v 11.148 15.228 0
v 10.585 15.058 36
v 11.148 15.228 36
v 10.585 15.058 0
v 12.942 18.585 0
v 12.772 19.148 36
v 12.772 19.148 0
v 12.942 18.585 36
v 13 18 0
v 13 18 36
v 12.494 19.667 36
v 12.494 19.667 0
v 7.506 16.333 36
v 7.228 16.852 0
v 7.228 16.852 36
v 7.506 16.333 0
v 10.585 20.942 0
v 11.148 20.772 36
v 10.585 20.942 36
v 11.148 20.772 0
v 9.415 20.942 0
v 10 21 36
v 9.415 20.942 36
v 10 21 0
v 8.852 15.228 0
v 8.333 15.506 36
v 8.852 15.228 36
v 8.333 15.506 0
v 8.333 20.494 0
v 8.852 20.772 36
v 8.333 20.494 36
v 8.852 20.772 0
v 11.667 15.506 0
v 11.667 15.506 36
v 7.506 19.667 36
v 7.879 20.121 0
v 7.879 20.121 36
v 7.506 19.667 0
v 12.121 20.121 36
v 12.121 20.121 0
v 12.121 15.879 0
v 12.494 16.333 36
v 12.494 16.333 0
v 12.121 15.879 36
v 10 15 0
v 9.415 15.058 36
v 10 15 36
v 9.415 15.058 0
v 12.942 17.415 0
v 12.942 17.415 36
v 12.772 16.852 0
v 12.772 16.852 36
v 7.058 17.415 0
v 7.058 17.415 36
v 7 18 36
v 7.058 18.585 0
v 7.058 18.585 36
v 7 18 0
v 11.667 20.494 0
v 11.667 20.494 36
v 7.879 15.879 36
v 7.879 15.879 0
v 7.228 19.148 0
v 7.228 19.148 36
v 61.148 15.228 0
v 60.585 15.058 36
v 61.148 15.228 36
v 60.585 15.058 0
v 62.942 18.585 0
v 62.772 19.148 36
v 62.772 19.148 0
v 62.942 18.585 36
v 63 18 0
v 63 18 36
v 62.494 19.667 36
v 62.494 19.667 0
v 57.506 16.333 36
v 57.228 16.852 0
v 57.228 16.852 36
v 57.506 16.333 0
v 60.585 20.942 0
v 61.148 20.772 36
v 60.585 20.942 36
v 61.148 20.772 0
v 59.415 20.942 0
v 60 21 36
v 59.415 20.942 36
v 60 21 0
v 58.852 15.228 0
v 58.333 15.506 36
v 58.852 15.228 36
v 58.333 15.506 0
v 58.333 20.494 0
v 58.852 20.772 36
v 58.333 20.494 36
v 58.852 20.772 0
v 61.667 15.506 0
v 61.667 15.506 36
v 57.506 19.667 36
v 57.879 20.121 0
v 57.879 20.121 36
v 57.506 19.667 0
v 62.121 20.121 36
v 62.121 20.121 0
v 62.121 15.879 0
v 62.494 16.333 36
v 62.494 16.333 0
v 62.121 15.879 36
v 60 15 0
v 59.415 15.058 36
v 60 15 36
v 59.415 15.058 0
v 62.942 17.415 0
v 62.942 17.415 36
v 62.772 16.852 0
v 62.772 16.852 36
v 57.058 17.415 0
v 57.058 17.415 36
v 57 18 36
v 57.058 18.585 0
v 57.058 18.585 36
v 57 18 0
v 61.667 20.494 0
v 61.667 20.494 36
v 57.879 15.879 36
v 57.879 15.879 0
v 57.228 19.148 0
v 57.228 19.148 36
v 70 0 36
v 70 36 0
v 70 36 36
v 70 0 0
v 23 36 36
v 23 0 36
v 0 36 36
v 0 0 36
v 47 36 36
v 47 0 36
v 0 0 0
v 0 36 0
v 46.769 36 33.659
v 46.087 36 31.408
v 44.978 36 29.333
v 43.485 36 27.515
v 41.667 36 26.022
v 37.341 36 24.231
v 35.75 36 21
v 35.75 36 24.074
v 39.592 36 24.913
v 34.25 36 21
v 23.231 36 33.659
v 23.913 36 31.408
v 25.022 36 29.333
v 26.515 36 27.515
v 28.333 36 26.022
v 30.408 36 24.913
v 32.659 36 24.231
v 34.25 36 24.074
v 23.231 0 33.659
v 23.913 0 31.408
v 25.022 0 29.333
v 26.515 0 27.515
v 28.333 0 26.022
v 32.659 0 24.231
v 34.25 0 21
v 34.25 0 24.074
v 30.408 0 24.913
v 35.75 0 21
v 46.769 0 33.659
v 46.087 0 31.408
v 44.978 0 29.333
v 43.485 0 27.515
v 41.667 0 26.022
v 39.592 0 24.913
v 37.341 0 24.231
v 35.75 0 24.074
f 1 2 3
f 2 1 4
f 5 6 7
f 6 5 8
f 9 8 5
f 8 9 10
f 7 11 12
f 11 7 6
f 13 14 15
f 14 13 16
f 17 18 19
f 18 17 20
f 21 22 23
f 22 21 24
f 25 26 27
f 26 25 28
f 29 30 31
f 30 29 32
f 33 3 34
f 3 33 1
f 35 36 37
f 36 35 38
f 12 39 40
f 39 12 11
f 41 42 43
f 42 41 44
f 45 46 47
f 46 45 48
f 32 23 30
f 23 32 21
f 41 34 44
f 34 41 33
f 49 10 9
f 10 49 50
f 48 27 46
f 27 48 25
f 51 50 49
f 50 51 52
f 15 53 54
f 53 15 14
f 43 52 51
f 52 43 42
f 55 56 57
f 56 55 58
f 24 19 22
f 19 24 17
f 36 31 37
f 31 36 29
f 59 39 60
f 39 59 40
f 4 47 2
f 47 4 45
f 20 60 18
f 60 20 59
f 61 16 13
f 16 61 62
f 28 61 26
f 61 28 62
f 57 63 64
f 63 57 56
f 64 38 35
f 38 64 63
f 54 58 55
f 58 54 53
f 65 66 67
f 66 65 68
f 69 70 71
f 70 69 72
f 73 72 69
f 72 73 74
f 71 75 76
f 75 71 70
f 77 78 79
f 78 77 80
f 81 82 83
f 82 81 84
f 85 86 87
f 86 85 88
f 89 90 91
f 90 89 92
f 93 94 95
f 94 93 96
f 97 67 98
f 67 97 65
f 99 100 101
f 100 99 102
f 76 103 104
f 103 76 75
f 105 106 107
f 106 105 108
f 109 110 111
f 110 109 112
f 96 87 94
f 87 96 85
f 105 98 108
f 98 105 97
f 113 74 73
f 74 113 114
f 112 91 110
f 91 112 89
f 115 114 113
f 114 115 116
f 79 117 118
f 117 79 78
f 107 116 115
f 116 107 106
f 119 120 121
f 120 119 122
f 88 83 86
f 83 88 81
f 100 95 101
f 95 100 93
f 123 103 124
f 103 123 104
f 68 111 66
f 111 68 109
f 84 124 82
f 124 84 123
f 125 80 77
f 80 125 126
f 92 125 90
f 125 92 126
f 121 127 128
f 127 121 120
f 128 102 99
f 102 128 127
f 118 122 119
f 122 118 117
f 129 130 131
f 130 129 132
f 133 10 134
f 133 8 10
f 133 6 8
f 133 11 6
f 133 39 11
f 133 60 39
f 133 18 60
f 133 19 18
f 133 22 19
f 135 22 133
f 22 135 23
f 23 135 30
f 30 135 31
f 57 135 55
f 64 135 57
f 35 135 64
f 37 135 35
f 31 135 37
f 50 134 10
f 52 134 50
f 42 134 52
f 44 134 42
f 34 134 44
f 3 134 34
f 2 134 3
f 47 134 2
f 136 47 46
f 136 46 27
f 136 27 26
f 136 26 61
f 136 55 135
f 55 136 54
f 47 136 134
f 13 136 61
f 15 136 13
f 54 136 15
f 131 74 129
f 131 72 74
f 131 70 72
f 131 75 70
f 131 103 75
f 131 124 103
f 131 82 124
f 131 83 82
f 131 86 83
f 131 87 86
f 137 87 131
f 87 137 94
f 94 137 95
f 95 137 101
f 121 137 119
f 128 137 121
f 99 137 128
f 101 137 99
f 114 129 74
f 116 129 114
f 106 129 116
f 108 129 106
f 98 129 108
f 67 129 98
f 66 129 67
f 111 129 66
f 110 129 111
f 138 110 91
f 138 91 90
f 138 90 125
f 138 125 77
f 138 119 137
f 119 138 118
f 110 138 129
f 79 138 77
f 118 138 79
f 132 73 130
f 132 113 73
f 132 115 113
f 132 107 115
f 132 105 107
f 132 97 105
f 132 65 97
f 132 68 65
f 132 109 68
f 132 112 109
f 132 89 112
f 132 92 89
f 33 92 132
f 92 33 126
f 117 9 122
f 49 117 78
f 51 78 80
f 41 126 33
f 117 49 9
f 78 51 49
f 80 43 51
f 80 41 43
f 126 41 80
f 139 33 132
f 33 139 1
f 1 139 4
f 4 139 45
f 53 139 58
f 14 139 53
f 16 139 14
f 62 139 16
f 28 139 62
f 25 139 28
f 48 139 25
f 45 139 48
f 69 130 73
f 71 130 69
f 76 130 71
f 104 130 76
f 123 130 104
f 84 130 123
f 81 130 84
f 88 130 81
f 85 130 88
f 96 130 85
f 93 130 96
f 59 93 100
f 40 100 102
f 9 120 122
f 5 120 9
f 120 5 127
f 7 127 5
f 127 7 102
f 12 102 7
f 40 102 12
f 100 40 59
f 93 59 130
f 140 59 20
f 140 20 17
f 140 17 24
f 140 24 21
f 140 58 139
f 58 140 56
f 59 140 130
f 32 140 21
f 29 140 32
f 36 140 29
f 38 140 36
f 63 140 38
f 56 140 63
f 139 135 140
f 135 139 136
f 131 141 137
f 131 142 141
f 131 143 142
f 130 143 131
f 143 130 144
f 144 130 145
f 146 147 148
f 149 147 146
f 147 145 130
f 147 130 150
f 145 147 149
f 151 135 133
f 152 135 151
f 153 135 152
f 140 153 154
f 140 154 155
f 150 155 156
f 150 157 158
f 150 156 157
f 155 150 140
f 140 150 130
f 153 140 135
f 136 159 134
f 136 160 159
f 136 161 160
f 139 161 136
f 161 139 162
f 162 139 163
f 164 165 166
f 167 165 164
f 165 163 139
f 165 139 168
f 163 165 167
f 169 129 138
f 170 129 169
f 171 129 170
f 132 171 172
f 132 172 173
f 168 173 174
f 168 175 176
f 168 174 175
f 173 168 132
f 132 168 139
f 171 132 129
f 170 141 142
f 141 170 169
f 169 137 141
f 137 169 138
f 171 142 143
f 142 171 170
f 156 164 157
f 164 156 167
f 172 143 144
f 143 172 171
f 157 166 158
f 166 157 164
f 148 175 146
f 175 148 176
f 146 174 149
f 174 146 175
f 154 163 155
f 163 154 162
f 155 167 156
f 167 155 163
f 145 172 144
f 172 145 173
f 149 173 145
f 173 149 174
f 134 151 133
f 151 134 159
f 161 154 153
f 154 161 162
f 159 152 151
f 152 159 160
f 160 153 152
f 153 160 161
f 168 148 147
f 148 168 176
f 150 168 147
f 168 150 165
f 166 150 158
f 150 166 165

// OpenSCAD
$fn = 32;

// ----------------------------------------------------------------------
// Saddle clamp: split shaft clamp
// ----------------------------------------------------------------------

// --- parameters (mm) ---
blk_l = 70;               // block length, X
blk_w = 36;               // block width, Y
blk_h = 36;               // block height
clamp_r = 12;             // shaft groove radius
hole_r = 3;               // bolt hole radius
hole_m = 10;              // bolt hole margin from the ends
saw_w = 1.5;              // saw kerf width

saw_depth = clamp_r + 3;  // saw kerf depth

difference() {
  cube([blk_l, blk_w, blk_h]);
  translate([blk_l / 2, -1, blk_h])
    rotate([-90, 0, 0])
      cylinder(h = blk_w + 2, r = clamp_r);
  for (sx = [0, 1])
    translate([sx ? blk_l - hole_m : hole_m, blk_w / 2, -1])
      cylinder(r = hole_r, h = blk_h + 2);
  translate([blk_l / 2 - saw_w / 2, -1, blk_h - saw_depth])
    cube([saw_w, blk_w + 2, saw_depth + 1]);
}
